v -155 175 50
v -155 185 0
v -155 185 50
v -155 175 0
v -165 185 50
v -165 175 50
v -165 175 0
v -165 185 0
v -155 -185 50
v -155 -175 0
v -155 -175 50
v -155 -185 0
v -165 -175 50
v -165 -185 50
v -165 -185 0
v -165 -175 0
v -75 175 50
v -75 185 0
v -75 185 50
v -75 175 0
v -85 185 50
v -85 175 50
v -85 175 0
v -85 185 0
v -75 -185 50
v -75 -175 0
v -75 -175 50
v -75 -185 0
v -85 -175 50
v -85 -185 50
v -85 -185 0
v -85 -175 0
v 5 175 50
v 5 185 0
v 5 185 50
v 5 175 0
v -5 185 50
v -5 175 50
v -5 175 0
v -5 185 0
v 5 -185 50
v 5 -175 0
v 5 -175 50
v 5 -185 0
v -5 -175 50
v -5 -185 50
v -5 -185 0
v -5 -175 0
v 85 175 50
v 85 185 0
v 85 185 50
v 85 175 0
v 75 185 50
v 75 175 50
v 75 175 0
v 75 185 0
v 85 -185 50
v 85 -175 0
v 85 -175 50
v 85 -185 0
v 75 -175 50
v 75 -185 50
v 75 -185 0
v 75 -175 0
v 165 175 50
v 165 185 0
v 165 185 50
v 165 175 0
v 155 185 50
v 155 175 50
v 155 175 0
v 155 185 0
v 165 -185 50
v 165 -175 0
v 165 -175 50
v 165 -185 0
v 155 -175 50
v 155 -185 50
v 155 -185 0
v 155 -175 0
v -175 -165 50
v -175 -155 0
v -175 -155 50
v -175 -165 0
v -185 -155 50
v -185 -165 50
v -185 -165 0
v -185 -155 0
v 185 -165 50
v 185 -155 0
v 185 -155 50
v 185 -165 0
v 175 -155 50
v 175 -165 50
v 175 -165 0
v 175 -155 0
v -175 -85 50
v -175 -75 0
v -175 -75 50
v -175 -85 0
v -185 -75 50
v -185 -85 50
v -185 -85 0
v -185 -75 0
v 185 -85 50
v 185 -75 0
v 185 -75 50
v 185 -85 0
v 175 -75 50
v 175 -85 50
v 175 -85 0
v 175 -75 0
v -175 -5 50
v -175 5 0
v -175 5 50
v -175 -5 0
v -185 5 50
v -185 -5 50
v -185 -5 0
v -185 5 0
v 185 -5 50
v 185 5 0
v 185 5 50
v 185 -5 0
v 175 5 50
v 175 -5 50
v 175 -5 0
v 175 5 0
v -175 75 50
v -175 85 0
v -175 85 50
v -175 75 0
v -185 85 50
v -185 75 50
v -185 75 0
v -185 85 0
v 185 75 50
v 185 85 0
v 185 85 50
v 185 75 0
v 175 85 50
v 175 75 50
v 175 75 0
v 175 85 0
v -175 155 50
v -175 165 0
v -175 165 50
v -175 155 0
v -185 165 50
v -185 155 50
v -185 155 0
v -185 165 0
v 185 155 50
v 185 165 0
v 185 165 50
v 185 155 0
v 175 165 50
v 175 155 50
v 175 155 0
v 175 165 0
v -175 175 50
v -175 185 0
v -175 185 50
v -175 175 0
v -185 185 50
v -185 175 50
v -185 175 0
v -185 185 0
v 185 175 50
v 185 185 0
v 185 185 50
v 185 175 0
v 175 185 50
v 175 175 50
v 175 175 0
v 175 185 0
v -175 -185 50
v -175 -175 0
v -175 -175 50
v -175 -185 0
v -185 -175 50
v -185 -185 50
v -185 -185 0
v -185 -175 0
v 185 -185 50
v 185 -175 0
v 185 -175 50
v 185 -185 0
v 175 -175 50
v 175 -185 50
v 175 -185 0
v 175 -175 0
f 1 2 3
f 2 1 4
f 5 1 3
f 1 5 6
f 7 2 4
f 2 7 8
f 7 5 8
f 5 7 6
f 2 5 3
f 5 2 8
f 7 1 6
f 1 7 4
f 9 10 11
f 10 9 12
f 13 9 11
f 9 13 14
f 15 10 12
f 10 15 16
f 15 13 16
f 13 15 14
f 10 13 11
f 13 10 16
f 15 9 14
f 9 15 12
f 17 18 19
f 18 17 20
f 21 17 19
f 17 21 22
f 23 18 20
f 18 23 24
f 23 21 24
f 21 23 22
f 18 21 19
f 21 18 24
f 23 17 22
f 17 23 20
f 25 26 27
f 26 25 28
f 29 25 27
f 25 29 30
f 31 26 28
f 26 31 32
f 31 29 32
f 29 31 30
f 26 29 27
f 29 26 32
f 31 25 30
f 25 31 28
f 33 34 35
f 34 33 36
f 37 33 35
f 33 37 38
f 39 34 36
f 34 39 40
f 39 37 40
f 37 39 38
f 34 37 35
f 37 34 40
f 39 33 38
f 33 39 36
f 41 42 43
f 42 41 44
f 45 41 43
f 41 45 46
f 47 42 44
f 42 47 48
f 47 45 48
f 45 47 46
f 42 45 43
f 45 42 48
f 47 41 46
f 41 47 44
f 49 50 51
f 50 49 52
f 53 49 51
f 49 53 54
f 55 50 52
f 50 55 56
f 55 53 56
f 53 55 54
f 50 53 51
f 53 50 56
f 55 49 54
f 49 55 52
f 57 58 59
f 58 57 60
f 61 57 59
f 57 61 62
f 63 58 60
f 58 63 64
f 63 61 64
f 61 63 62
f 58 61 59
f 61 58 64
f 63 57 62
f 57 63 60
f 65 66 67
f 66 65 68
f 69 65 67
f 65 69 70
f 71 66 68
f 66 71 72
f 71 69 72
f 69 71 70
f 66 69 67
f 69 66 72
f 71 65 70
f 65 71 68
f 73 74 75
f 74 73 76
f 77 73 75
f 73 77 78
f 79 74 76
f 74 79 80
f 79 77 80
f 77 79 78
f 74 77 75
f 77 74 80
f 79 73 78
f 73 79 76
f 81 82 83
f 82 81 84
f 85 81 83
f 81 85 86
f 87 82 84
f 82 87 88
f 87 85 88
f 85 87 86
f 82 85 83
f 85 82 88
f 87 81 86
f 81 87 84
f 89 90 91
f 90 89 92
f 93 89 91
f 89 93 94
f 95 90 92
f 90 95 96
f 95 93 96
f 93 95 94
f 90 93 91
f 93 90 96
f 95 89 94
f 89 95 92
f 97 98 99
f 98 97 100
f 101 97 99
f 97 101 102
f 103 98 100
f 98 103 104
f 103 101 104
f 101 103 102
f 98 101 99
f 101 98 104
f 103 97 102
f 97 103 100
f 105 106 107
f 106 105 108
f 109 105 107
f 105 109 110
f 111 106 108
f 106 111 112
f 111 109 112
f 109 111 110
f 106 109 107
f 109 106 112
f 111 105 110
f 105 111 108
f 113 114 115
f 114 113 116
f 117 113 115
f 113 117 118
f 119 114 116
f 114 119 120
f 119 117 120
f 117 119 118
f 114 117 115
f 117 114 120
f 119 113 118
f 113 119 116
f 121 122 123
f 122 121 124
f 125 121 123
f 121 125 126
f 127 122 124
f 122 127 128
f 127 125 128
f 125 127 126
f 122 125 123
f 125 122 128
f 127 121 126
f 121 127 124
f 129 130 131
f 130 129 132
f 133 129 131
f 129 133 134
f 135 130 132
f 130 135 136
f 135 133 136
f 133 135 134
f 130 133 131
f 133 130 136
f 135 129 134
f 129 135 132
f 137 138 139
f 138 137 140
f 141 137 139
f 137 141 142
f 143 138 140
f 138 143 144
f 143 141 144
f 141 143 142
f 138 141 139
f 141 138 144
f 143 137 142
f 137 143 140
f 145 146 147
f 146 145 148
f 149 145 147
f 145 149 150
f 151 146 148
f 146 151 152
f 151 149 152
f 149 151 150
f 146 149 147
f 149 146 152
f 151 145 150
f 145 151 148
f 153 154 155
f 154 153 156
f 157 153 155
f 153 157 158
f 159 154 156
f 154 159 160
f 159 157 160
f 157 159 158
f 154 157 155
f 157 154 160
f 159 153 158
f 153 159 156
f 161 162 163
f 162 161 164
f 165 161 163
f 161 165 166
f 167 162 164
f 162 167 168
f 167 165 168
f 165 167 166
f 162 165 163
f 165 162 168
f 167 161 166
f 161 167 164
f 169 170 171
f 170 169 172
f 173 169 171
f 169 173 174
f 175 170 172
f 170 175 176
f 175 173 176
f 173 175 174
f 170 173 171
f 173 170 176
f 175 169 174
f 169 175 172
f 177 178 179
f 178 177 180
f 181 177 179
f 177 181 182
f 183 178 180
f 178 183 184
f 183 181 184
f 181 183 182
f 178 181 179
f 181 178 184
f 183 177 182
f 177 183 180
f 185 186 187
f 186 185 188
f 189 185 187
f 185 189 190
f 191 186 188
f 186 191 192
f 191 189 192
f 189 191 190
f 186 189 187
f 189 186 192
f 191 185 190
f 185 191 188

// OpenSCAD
// Cage slice 13
// Internal cavity: 350 x 350 x 700 mm
// Bar thickness: 10 mm (square)
// Gap between bars: 70 mm (uniform)
// Slice index: 13, slice Z range: [650, 700] (local coordinates 0..50)
// This file places the slice with its bottom on Z=0; when assembling, translate in Z by 650 mm.
// Export to STL with OpenSCAD: Render -> Export as STL.

bar = 10;
gap = 70;
s = bar + gap;
$fn = 64;  // cylinder resolution

x_centers = [-160, -80, 0, 80, 160];
y_centers = [-160, -80, 0, 80, 160];
z_centers = [5, 85, 165, 245, 325, 405, 485, 565, 645];

slice_index = 13;
slice_h = 50;

front_y = 180;
back_y = -180;
left_x = -180;
right_x = 180;
panel_length = 370;

hole_diam = 6.6;

module slice() {
    union() {
        // vertical bars on front and back (along Z)
        for (x = x_centers) {
            translate([x, front_y, slice_h/2]) cube([bar, bar, slice_h], center=true);
            translate([x, back_y, slice_h/2])  cube([bar, bar, slice_h], center=true);
        }
        // vertical bars on left and right (along Z)
        for (y = y_centers) {
            translate([left_x, y, slice_h/2])  cube([bar, bar, slice_h], center=true);
            translate([right_x, y, slice_h/2]) cube([bar, bar, slice_h], center=true);
        }
        // explicit corner vertical bars (ensure 4 corners for M6 rods)
        translate([-180, 180, slice_h/2]) cube([bar, bar, slice_h], center=true);
        translate([180, 180, slice_h/2]) cube([bar, bar, slice_h], center=true);
        translate([-180, -180, slice_h/2]) cube([bar, bar, slice_h], center=true);
        translate([180, -180, slice_h/2]) cube([bar, bar, slice_h], center=true);

        // horizontal bars (10 mm thick in Z) that lie inside this slice
        for (zc = z_centers) {
            z_local = zc - slice_index*slice_h;
            // include this horizontal bar if its center lies within this slice and it fits entirely here
            if (z_local >= bar/2 && z_local <= slice_h - bar/2) {
                // front and back horizontal bars (run along X)
                translate([0, front_y, z_local]) cube([panel_length, bar, bar], center=true);
                translate([0, back_y,  z_local]) cube([panel_length, bar, bar], center=true);
                // left and right horizontal bars (run along Y)
                translate([left_x, 0, z_local]) cube([bar, panel_length, bar], center=true);
                translate([right_x,0, z_local]) cube([bar, panel_length, bar], center=true);
            }
        }
    }
}

difference() {
    slice();
    // four vertical holes for M6 rods through corner bars (slightly longer than slice to ensure clean subtraction)
    translate([-180, 180, slice_h/2]) rotate([0,0,0]) cylinder(h = slice_h*4, r = hole_diam/2, center=true);
    translate([180, 180, slice_h/2]) rotate([0,0,0]) cylinder(h = slice_h*4, r = hole_diam/2, center=true);
    translate([-180, -180, slice_h/2]) rotate([0,0,0]) cylinder(h = slice_h*4, r = hole_diam/2, center=true);
    translate([180, -180, slice_h/2]) rotate([0,0,0]) cylinder(h = slice_h*4, r = hole_diam/2, center=true);
}

slice();
